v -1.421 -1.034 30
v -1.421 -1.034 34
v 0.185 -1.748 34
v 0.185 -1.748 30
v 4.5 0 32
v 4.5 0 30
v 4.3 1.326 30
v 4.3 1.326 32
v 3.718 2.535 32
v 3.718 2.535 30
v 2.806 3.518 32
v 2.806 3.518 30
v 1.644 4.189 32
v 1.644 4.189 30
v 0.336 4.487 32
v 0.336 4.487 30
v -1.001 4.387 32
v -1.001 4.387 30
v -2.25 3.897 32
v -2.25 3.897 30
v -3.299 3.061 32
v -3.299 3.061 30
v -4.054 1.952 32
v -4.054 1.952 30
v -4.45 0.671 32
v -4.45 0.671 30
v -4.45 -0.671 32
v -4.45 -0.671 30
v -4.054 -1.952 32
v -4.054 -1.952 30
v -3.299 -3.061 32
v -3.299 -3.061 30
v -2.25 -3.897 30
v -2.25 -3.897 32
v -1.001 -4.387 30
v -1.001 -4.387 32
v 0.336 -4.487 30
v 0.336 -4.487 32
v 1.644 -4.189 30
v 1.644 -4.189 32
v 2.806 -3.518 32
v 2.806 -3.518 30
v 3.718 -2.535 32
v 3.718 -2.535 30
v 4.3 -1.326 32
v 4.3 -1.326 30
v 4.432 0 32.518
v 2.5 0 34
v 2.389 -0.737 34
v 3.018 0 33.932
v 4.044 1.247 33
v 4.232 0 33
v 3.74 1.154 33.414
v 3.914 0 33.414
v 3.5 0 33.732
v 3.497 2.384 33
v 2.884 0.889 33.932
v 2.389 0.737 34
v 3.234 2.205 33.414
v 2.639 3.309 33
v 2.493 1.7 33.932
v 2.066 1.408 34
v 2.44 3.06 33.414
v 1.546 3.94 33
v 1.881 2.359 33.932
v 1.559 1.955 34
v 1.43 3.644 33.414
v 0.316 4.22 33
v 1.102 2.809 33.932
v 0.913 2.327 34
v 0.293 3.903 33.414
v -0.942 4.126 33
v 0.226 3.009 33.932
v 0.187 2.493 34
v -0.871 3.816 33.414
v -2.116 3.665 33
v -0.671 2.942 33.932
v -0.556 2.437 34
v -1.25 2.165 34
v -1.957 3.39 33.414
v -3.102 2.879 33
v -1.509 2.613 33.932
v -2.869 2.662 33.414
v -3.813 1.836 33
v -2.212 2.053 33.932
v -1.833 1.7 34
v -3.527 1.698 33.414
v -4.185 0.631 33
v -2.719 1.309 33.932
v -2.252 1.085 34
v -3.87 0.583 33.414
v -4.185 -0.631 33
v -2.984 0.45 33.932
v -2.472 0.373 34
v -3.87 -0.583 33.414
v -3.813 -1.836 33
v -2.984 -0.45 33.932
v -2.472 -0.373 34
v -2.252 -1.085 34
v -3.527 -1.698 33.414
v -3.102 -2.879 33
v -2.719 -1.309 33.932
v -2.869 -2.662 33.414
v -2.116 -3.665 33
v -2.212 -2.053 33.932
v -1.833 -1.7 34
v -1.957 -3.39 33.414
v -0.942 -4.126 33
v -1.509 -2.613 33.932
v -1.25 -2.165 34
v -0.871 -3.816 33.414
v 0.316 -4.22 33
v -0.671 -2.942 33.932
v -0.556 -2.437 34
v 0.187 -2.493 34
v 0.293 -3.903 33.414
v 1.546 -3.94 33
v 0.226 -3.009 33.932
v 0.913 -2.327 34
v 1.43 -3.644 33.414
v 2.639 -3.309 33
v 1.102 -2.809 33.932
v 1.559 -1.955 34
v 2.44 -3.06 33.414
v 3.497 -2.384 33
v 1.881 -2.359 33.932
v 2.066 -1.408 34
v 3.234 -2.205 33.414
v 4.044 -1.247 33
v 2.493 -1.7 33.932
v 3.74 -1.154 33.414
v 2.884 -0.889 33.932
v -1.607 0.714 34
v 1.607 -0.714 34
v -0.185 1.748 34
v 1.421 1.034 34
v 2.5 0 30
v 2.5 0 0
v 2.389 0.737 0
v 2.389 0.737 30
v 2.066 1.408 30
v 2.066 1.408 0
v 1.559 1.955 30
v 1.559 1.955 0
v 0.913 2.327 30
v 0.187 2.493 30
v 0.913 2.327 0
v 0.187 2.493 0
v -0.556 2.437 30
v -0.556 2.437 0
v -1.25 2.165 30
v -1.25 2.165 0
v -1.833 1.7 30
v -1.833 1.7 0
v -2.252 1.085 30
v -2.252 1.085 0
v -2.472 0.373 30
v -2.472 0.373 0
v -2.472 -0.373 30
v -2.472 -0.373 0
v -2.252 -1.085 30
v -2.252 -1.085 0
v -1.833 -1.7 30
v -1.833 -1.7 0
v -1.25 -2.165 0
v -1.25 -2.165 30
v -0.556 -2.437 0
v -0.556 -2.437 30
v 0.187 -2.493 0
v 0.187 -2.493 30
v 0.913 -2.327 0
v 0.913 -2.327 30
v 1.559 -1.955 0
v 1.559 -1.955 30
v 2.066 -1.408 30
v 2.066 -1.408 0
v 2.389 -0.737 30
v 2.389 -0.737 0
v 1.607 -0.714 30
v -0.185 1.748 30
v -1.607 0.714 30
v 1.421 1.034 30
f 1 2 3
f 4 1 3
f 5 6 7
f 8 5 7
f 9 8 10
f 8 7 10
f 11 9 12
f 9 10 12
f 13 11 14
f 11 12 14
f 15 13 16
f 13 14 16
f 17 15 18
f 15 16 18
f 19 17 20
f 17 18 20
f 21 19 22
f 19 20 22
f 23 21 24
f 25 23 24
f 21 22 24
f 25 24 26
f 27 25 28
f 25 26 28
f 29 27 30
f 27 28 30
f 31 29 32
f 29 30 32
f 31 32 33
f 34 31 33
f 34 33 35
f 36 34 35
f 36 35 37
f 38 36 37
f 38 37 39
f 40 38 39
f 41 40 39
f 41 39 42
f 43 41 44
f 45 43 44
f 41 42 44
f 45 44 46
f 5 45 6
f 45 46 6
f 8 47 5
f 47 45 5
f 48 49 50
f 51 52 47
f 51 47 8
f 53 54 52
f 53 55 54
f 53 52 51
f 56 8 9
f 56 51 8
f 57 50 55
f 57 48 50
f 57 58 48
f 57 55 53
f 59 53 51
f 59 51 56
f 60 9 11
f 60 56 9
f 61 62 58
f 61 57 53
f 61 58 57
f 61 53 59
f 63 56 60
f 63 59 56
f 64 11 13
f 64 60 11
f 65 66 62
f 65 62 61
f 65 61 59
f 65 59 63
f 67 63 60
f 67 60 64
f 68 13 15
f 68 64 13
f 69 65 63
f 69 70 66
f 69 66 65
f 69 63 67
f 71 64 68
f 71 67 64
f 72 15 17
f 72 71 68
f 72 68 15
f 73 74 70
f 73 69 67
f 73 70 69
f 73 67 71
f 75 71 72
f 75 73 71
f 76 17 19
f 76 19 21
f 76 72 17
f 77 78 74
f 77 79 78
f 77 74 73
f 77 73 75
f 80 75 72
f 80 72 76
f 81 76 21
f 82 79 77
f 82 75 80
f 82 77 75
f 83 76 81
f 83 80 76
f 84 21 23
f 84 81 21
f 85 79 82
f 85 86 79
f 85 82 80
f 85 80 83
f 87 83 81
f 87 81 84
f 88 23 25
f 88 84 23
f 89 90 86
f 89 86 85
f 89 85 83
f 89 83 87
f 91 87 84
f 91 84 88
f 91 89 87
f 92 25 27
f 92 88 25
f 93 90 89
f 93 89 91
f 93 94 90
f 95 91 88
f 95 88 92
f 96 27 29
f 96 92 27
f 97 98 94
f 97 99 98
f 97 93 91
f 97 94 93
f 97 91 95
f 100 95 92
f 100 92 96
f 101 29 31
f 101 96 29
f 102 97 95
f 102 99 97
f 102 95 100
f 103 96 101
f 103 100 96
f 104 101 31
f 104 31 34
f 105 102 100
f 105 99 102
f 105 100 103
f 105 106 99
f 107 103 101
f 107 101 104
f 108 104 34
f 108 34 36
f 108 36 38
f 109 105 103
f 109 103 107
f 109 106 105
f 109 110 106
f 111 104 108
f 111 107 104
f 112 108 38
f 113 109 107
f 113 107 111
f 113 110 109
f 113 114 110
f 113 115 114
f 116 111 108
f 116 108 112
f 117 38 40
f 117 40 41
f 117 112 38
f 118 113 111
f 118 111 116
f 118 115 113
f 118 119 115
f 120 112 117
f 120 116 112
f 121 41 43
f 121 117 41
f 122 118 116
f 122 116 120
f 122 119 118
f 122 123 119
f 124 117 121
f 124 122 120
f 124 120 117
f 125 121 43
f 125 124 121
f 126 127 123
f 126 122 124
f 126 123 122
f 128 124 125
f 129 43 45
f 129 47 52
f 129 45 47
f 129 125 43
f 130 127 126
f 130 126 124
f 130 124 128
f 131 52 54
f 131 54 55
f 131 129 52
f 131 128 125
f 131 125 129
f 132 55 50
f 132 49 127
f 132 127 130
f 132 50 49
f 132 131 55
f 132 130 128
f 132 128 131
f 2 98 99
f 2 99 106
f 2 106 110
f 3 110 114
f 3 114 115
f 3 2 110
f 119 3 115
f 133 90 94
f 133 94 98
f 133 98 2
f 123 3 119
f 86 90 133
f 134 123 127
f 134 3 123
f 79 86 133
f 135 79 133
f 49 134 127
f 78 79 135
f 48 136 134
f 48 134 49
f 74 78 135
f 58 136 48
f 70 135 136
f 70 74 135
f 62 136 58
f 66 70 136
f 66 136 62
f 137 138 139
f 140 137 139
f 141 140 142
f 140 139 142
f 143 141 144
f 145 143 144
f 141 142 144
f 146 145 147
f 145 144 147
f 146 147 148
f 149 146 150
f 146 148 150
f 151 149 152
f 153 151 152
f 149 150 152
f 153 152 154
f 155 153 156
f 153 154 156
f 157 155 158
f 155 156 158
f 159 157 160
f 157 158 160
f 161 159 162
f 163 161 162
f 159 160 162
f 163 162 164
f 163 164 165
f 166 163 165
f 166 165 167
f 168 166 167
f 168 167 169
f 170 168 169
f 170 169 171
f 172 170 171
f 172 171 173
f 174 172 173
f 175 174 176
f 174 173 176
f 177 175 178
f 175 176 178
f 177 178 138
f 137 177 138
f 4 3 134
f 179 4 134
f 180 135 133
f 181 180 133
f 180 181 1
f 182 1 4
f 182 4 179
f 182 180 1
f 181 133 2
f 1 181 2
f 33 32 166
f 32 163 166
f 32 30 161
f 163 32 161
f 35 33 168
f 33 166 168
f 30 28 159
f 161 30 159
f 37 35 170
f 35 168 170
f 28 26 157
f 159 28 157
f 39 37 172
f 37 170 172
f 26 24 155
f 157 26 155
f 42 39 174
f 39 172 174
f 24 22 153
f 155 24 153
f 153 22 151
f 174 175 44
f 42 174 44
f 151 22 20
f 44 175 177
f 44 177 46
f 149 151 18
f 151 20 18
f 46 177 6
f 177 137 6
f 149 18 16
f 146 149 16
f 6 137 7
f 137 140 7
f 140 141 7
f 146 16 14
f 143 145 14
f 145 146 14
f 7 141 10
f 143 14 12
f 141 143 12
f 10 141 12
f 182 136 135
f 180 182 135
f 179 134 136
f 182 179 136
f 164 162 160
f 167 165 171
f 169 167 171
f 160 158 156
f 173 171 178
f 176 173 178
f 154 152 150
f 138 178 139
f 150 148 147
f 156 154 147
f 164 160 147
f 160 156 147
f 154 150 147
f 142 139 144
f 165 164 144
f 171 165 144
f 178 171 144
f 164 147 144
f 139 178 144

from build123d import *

# Parameters (mm, degrees)
F0_R     = 2.5
F1_DEPTH = 30
F2_R     = 4.5
F3_DEPTH = 4
F4_R     = 2
F6_DEPTH = 4


with BuildPart() as f1:
    # F0 (on Top) → F1 (new body)
    with BuildSketch(Plane.XY):
        Circle(F0_R)
    extrude(amount=F1_DEPTH)

    # F2 (on face) → F3 (join)
    with BuildSketch(Plane.XY.offset(30)):
        Circle(F2_R)
    extrude(amount=F3_DEPTH)

    # F4
    f4_edges = [f1.edges().sort_by_distance(p)[0] for p in [
        (-4.5, 0, 34),
    ]]
    fillet(f4_edges, radius=F4_R)

    # F5 (on face) → F6 (cut)
    with BuildSketch(Plane.XY.offset(34)):
        Polygon((-0.185112, 1.748257), (-1.606591, 0.713817), (-1.421479, -1.03444), (0.185112, -1.748257), (1.606591, -0.713817), (1.421479, 1.03444), align=None)
    extrude(amount=-F6_DEPTH, mode=Mode.SUBTRACT)


solid = f1.part
